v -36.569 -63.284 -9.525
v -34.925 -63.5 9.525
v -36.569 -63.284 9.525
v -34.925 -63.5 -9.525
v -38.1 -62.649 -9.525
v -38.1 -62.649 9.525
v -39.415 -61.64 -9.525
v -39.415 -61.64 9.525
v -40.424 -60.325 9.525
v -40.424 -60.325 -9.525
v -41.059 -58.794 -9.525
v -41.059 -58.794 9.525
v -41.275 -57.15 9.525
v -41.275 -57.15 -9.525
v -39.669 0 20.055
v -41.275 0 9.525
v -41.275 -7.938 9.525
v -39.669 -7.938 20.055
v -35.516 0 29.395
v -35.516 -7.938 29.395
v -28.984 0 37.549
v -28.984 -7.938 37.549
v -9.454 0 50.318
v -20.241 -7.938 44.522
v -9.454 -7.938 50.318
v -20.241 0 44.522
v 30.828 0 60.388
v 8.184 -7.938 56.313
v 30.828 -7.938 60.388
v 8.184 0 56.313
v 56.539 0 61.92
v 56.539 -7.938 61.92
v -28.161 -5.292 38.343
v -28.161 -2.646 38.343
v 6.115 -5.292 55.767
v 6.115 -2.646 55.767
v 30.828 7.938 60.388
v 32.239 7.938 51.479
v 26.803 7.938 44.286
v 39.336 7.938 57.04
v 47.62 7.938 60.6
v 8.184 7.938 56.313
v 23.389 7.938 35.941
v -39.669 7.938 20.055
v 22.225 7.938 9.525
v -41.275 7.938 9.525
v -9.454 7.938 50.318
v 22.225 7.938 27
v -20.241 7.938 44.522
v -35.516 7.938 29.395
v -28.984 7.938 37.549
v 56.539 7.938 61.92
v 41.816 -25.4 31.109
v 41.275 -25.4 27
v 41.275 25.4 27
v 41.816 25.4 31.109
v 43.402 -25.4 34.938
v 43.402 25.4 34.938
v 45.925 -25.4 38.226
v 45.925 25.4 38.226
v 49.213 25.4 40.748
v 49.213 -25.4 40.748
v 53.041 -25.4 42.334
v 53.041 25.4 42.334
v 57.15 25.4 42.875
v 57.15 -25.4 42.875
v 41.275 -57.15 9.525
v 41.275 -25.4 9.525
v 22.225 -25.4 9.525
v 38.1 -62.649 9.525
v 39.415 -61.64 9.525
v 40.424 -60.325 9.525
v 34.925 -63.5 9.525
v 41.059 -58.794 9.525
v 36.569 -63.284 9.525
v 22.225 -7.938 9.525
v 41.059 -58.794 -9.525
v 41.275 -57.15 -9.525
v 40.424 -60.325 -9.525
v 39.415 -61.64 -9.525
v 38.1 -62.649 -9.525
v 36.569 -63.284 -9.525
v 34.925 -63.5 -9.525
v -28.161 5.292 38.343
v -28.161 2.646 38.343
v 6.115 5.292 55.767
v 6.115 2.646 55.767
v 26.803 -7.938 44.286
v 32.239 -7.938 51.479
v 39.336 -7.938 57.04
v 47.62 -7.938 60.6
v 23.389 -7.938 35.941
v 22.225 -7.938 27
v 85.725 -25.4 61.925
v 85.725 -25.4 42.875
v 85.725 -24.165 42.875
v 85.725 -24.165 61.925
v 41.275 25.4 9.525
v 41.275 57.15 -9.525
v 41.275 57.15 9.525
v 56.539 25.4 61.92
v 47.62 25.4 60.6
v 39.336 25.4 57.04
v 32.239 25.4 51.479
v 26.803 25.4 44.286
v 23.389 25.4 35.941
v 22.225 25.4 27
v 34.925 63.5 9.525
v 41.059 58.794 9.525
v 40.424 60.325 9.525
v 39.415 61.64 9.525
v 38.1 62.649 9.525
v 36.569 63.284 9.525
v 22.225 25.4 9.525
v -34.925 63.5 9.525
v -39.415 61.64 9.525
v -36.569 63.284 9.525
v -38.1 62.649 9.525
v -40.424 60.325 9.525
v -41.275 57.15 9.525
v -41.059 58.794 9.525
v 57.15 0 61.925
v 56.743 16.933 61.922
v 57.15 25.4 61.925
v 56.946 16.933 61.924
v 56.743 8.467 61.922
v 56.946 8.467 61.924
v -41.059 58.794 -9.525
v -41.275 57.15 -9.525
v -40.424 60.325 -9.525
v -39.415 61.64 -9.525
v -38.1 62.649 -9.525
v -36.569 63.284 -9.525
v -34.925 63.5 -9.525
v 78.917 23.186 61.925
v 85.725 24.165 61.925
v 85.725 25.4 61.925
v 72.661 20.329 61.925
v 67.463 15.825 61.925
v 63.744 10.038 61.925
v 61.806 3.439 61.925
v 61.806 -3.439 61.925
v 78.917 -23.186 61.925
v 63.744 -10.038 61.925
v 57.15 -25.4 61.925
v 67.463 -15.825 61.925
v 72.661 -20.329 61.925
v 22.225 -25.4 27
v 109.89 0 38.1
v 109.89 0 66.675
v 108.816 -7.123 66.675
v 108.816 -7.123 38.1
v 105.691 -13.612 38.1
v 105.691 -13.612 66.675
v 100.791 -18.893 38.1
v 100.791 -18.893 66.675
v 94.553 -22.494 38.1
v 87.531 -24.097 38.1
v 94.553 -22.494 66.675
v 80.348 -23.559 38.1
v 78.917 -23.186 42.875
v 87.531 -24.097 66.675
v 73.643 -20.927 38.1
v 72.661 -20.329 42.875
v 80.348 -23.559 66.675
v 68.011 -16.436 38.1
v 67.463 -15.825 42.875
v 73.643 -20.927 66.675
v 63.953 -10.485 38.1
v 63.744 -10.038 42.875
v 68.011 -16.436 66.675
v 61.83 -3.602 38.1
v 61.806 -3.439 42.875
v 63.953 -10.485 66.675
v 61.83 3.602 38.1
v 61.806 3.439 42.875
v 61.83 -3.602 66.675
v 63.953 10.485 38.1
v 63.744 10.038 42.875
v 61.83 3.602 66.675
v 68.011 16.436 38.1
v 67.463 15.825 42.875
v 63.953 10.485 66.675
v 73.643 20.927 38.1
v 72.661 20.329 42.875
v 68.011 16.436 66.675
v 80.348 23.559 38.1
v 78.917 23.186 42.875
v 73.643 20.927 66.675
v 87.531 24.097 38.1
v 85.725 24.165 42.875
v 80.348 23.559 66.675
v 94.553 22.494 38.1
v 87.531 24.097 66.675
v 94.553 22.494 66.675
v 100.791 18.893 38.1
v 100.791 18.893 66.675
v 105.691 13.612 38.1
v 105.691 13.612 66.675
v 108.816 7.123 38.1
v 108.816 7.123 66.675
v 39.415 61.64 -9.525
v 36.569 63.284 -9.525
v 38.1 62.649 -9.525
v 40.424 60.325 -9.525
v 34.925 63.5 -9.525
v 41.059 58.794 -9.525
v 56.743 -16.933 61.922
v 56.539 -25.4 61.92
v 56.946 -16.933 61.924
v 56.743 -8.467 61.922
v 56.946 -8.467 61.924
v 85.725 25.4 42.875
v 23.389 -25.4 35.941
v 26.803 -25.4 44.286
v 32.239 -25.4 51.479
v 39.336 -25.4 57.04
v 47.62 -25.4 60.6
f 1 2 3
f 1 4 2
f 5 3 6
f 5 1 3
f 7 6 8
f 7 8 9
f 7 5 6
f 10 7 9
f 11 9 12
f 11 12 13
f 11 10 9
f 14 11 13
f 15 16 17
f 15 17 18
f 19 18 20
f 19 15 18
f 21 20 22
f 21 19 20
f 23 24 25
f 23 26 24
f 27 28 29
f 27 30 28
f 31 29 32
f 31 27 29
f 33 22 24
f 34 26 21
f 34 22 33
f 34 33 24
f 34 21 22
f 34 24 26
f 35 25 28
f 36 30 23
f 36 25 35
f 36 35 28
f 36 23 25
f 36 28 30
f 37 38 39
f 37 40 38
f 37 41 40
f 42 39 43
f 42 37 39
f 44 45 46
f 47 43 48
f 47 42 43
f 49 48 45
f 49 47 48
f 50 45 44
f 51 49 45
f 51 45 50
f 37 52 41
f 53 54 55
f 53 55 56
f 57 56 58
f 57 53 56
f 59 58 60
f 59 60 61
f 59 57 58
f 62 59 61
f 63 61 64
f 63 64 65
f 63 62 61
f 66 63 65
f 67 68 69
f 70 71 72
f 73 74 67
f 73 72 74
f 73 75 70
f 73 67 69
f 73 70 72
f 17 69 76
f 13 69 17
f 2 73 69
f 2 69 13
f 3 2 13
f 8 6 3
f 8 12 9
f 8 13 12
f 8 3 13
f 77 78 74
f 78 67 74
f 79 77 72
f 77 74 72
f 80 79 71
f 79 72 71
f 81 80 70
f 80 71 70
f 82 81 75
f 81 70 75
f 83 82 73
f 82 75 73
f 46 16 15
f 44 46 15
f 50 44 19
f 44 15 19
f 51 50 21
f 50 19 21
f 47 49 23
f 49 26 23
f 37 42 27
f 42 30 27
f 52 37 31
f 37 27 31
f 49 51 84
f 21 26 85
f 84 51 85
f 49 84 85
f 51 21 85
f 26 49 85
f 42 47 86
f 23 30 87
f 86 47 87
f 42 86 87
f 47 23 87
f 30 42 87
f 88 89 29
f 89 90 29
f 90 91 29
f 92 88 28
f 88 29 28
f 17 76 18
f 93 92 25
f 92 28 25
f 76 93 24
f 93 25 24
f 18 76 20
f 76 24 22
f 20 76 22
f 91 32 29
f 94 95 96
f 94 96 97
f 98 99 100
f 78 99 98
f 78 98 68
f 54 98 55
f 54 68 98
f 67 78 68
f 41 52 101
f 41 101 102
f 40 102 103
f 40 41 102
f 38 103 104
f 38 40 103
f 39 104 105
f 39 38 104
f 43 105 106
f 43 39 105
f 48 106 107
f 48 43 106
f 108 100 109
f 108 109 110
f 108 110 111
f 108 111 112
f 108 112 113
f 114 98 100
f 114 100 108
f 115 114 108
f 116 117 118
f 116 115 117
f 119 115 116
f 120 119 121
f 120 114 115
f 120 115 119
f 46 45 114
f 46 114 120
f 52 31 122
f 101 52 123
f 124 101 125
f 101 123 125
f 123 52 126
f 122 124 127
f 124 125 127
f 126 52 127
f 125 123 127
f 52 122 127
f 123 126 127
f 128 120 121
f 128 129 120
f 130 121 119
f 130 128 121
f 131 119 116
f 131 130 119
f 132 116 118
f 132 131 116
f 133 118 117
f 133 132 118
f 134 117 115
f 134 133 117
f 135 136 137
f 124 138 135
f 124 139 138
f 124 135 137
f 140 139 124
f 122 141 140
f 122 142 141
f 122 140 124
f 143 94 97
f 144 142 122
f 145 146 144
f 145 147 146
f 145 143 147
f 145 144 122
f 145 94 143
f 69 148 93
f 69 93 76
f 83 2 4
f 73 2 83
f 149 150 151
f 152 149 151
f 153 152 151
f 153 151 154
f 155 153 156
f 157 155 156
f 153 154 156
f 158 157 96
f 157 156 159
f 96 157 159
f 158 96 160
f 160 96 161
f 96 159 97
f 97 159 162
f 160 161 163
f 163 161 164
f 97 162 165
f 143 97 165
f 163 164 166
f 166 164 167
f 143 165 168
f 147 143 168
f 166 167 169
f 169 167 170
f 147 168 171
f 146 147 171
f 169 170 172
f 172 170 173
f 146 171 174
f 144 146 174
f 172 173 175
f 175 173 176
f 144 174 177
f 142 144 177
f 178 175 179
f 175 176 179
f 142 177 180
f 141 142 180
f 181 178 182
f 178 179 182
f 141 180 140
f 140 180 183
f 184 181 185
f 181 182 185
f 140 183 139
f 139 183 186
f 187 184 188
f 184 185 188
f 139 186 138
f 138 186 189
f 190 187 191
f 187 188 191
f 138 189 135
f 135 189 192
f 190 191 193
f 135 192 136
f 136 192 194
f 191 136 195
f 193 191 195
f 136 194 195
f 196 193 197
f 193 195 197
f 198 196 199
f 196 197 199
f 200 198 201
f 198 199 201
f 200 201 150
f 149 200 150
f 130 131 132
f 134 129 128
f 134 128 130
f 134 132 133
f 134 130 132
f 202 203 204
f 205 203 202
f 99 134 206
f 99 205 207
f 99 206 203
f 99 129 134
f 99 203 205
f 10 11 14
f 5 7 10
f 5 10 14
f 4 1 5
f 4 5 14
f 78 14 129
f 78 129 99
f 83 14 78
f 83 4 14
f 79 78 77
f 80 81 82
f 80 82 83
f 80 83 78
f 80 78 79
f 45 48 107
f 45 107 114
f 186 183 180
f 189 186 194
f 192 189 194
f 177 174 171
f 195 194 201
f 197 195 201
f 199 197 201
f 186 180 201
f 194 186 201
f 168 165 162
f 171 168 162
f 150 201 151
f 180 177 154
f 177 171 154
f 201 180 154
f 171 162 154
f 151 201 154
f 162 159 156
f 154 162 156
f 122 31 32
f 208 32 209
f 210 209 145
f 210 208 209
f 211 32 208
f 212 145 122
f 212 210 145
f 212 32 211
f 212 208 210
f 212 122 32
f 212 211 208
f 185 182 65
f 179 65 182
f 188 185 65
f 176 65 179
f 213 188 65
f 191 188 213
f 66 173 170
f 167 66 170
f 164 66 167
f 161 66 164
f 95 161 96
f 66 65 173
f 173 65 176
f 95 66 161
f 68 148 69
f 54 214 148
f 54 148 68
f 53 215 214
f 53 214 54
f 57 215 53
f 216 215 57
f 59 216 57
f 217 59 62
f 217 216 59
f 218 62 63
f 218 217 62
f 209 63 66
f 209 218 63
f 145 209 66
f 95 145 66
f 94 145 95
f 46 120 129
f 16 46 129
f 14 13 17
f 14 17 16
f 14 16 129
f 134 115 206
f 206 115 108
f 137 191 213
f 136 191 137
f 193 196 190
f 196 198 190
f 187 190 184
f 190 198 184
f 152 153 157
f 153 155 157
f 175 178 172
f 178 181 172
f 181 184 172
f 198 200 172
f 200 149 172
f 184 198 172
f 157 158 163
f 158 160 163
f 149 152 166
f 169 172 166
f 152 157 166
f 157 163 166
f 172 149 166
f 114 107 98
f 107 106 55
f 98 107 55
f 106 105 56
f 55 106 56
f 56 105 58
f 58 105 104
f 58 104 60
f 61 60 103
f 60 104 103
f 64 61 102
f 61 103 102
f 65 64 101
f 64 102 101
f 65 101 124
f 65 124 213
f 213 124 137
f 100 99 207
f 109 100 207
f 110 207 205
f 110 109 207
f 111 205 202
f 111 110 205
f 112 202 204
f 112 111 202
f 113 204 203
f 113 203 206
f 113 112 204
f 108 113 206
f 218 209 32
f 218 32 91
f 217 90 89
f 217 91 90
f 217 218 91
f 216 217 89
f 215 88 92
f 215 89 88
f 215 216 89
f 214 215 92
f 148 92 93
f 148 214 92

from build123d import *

# Parameters (mm, degrees)
F1_DEPTH = 63.5
F0_W     = 26.6352667648
F0_H     = 19.05
F2_DEPTH = 25.4
F3_DEPTH = 7.9375
F5_R     = 6.35


with BuildPart() as f1:
    # F0 (on Front) → F1 (new body, symmetric)
    with BuildSketch(Plane.XZ):
        Polygon((-41.275, 9.525), (-41.275, -9.525), (41.275, -9.525), (41.275, 9.525), (22.225, 9.525), align=None)
    extrude(amount=F1_DEPTH, both=True)

    # F0 (on Front) → F2 (join, symmetric)
    with BuildSketch(Plane.XZ):
        with BuildLine():
            Line((22.225, 9.525), (41.275, 9.525))
            Line((41.275, 9.525), (41.275, 27.0002))
            ThreePointArc((41.275, 27.0002), (45.9246798487, 38.2255201513), (57.15, 42.8752))
            Line((57.15, 42.8752), (59.0897332352, 42.8752))
            Line((59.0897332352, 42.8752), (59.0897332352, 61.9252))
            Line((59.0897332352, 61.9252), (57.15, 61.9252))
            add(Edge.make_bspline(
                [(56.5390411257, 61.9198557007), (56.7424803889, 61.9218514766), (56.9461336922, 61.9236329014), (57.15, 61.9252)],
                knots=[111.1067755669, 111.1067755669, 111.1067755669, 111.1067755669, 111.5045361635, 111.5045361635, 111.5045361635, 111.5045361635], degree=3))
            ThreePointArc((56.5390411257, 61.9198557007), (32.2392255872, 51.4789447218), (22.225, 27.0002))
            Line((22.225, 27.0002), (22.225, 9.525))
        make_face()
        with Locations((72.4073666176, 52.4002)):
            Rectangle(F0_W, F0_H)
    extrude(amount=F2_DEPTH, both=True)

    # F0 (on Front) → F3 (join, symmetric)
    with BuildSketch(Plane.XZ):
        with BuildLine():
            add(Edge.make_bspline(
                [(-41.275, 9.525), (-40.4140404528, 44.079992279), (-0.2878058759, 61.3623740581), (56.5390411257, 61.9198557007)],
                knots=[0, 0, 0, 0, 111.1067755669, 111.1067755669, 111.1067755669, 111.1067755669], degree=3))
            Line((-41.275, 9.525), (22.225, 9.525))
            Line((22.225, 9.525), (22.225, 27.0002))
            ThreePointArc((22.225, 27.0002), (32.2392255872, 51.4789447218), (56.5390411257, 61.9198557007))
        make_face()
    extrude(amount=F3_DEPTH, both=True)

    # F0 (on Front) → F4 (revolve)
    with BuildSketch(Plane.XZ):
        Polygon((85.725, 66.675), (85.725, 61.9252), (85.725, 42.8752), (85.725, 38.1), (109.8897332352, 38.1), (109.8897332352, 66.675), align=None)
    revolve(axis=Axis((85.725, 0, 52.4002), (0, 0, -1)))

    # F5
    f5_edges = [f1.edges().sort_by_distance(p)[0] for p in [
        (-41.275, -63.5, 0),
        (41.275, -63.5, 0),
        (41.275, 63.5, 0),
        (-41.275, 63.5, 0),
    ]]
    fillet(f5_edges, radius=F5_R)


solid = f1.part
